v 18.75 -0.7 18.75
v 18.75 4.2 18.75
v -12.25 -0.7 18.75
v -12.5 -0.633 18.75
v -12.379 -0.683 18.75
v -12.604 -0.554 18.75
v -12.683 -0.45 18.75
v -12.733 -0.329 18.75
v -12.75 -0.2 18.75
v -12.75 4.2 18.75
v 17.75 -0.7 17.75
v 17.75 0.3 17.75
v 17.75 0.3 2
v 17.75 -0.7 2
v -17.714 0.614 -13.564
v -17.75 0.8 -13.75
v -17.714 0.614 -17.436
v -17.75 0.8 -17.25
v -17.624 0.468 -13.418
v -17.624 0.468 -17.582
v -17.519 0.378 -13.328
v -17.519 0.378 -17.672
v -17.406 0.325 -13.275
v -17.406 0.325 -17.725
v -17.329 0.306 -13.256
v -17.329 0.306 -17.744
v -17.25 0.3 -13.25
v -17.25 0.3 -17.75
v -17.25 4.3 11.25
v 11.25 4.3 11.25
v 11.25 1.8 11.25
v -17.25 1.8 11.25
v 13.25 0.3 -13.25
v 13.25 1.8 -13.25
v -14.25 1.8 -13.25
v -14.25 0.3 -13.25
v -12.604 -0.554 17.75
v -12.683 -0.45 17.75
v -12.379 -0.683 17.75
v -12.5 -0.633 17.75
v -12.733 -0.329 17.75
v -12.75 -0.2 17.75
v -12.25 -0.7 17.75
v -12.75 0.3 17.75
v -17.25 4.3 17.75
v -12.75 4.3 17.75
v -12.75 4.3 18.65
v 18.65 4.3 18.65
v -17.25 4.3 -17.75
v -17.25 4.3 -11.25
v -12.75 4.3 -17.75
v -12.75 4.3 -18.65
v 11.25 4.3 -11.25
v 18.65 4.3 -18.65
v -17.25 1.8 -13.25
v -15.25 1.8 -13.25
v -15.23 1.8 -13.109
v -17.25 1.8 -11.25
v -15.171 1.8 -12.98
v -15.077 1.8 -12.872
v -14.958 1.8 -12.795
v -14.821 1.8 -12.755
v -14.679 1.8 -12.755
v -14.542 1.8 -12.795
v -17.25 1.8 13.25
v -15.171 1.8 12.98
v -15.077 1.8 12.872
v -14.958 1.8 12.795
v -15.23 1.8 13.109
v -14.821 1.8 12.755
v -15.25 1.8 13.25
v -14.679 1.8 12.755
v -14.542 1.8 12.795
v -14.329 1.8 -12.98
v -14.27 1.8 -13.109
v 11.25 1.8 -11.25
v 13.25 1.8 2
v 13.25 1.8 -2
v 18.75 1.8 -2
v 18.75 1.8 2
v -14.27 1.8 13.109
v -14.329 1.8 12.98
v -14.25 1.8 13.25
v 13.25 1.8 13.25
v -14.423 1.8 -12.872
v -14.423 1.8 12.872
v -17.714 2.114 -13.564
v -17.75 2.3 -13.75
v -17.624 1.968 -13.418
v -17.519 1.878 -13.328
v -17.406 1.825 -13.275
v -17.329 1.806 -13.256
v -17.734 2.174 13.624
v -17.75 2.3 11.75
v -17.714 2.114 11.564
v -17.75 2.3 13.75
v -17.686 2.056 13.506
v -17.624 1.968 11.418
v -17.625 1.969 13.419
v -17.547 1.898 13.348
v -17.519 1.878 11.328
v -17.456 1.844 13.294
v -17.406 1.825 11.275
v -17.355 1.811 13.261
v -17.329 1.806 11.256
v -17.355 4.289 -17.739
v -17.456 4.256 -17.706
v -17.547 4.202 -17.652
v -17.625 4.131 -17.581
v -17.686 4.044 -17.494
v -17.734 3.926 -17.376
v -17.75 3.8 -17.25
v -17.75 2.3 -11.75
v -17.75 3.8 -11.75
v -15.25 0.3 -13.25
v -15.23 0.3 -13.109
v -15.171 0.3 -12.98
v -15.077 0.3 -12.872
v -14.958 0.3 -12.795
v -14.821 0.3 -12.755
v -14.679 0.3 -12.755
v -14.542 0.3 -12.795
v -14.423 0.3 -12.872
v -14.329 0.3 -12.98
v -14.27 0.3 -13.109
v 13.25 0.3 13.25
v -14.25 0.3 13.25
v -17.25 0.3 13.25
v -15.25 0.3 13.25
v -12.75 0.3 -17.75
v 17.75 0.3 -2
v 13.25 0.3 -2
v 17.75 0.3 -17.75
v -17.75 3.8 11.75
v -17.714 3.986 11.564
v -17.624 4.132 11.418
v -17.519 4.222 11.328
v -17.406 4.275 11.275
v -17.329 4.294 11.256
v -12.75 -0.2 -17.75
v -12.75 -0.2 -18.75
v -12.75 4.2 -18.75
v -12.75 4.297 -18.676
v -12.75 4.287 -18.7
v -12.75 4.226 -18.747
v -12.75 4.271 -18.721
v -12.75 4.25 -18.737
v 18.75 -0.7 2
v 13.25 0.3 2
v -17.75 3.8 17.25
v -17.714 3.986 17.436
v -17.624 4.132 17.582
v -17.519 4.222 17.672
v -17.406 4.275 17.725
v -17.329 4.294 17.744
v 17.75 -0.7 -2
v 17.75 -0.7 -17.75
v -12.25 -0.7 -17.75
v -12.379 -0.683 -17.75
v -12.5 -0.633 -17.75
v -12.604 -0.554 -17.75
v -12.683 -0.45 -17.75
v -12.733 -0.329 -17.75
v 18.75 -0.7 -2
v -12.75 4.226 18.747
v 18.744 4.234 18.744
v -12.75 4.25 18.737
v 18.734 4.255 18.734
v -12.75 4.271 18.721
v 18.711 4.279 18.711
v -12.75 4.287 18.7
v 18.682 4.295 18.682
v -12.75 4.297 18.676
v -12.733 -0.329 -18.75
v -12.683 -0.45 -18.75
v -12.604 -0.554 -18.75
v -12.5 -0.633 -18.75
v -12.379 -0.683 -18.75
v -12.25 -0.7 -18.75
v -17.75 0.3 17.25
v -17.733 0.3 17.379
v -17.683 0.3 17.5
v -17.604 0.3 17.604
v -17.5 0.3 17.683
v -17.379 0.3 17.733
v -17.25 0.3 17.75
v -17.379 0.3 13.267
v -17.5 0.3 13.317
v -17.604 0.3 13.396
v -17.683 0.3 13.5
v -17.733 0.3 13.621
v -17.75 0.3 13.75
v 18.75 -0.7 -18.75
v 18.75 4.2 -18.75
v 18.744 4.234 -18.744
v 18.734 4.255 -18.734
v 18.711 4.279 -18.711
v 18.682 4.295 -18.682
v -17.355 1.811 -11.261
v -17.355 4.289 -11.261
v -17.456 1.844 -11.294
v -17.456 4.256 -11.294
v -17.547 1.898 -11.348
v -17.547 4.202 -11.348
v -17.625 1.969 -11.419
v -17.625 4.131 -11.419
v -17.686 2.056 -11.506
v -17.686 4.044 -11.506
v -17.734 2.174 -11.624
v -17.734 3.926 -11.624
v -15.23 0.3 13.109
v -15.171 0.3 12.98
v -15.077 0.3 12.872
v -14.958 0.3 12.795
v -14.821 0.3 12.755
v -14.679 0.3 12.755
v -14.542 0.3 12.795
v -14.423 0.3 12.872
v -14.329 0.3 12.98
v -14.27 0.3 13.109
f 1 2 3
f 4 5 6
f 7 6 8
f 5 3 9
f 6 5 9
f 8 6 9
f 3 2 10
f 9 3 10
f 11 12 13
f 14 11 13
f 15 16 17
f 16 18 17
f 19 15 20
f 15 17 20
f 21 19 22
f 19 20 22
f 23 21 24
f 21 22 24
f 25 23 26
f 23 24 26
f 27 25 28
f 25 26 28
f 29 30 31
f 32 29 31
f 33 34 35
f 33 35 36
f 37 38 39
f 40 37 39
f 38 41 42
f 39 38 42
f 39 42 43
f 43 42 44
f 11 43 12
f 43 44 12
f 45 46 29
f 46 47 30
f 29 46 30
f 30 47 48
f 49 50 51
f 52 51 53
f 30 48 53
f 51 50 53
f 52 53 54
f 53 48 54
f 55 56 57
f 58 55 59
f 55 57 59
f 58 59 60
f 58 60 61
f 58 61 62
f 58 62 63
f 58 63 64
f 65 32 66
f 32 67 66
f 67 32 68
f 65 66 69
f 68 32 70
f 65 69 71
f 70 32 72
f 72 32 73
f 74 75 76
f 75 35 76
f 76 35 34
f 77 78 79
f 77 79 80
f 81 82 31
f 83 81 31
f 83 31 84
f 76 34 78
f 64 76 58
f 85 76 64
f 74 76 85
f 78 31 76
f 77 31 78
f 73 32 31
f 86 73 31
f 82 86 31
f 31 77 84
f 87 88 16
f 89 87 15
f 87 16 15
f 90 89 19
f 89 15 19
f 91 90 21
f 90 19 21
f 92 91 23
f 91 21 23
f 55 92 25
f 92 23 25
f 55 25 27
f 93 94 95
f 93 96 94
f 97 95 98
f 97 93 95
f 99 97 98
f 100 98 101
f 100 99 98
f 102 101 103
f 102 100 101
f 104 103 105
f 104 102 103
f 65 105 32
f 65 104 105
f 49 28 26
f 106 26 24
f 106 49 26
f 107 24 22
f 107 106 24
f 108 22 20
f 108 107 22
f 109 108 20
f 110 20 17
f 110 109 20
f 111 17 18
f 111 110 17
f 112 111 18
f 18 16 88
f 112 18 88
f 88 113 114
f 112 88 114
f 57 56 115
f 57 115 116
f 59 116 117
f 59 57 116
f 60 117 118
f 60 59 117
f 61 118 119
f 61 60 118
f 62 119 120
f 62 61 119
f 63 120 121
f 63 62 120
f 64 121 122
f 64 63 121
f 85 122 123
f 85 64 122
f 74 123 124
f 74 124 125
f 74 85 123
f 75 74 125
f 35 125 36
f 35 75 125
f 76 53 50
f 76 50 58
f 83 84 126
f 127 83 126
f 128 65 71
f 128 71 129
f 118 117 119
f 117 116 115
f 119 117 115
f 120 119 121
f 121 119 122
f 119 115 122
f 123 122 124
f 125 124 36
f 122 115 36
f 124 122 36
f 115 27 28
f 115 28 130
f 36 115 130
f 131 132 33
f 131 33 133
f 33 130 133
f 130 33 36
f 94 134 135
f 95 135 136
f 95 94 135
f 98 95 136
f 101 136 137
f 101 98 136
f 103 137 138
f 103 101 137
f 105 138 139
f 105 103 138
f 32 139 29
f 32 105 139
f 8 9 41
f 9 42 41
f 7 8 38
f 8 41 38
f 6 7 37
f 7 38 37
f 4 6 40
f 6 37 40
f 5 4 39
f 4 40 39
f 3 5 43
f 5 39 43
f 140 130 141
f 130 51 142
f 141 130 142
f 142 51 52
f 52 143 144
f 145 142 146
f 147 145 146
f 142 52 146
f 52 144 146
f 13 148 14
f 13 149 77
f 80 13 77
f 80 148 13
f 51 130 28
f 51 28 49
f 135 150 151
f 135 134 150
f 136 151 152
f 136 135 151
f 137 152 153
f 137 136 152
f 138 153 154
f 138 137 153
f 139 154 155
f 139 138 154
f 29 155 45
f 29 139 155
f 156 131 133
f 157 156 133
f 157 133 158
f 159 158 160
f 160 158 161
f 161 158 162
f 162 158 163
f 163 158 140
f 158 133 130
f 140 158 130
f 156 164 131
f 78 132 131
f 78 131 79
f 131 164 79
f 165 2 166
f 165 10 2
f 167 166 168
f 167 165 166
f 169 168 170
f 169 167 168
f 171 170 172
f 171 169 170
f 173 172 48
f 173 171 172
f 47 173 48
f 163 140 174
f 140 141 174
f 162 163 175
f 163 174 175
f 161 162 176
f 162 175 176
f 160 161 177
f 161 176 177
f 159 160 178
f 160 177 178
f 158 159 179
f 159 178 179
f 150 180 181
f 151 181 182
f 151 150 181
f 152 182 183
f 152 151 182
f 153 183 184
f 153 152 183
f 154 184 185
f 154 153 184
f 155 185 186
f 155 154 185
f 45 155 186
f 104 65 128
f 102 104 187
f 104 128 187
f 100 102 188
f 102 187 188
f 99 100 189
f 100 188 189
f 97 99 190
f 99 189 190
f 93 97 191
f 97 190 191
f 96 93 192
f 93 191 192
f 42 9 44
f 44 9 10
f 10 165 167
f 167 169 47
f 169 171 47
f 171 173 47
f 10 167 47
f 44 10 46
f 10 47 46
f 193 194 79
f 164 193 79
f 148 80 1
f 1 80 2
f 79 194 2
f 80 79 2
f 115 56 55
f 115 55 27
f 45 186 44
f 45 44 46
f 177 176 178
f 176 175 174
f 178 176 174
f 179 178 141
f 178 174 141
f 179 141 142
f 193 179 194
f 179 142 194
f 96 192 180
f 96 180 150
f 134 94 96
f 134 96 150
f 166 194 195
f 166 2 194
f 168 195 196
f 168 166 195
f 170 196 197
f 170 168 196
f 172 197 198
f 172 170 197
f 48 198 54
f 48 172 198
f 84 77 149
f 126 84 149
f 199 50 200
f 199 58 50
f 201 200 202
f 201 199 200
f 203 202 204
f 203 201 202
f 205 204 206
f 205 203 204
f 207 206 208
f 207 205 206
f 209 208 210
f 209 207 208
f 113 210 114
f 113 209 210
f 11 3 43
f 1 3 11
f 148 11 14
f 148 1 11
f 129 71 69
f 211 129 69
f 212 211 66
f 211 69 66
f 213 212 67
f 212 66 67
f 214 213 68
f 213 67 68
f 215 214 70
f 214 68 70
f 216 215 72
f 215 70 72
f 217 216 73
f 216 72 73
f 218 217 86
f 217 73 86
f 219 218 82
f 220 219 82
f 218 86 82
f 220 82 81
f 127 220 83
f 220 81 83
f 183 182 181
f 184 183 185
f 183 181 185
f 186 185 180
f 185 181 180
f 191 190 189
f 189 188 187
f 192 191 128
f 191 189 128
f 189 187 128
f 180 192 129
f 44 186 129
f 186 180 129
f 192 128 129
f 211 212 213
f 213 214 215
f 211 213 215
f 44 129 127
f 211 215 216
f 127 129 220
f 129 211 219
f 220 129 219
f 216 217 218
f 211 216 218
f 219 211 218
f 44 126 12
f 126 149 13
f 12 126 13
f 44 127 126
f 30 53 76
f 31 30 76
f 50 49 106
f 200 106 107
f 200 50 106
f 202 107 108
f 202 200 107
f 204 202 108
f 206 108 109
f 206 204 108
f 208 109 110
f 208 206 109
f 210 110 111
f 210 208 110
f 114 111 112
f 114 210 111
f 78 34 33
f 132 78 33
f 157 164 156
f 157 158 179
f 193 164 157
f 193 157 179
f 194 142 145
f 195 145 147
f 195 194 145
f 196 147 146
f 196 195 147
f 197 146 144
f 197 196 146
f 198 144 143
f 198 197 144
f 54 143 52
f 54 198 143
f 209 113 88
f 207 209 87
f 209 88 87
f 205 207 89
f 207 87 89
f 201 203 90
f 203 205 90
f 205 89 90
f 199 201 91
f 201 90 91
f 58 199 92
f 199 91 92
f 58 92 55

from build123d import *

# Parameters (mm, degrees)
PAD002_DEPTH       = 17.75
PAD002_DEPTH_BACK  = 17.75
POLARPATTERN_COUNT = 2
POLARPATTERN_ANGLE = 270
FILLET_R           = 0.5
PAD004_DEPTH       = 1.5
PAD005_DEPTH       = 5
FILLET005_R        = 0.1
FILLET006_R        = 0.5
FILLET007_R        = 0.5
SKETCH009_W        = 2.5
SKETCH009_H        = 4
POCKET001_DEPTH    = 36.501


with BuildPart() as part:
    # Sketch003 → Pad002 (new body, two sides)
    with BuildSketch(Plane.YZ) as pad002_sk:
        Polygon((0, -17.75), (4, -17.75), (4, -11.25), (1.5, -11.25), (1.5, -13.25), (0, -13.25), align=None)
    pad002 = extrude(amount=PAD002_DEPTH) + extrude(pad002_sk.sketch, amount=-PAD002_DEPTH_BACK)

    # PolarPattern: Pad002 ×2 about axis
    polarpattern_axis = Axis((0, 0, 0), (0, 1, 0))
    for i in range(1, POLARPATTERN_COUNT):
        add(pad002.rotate(polarpattern_axis, i * POLARPATTERN_ANGLE / (POLARPATTERN_COUNT - 1)))

    # Mirrored: Pad002 across Sketch003 H_Axis
    add(pad002.mirror(Plane.XY))

    # Fillet
    fillet_edges = [part.edges().sort_by_distance(p)[0] for p in [
        (-17.75, 4, 14.5),
        (-17.75, 2.75, 11.25),
        (-17.75, 0.75, 13.25),
        (-17.75, 1.5, 12.25),
        (-17.75, 2, 17.75),
    ]]
    fillet(fillet_edges, radius=FILLET_R)

    # Sketch007 → Pad004 (join)
    with BuildSketch(Plane(origin=(0, 1.5, 0), x_dir=(0, 0, -1), z_dir=(0, -1, 0))):
        with BuildLine():
            ThreePointArc((-13.25, -15.25), (-12.75, -14.75), (-13.25, -14.25))
            Line((-13.25, -14.25), (-13.25, -15.25))
        make_face()
    pad004 = extrude(amount=PAD004_DEPTH)

    # Sketch008 (on Face25 of Pad004) → Pad005 (join)
    with BuildSketch(Plane.ZX.offset(4)):
        Polygon((-18.75, 18.75), (18.75, 18.75), (18.75, -12.75), (17.75, -12.75), (17.75, 17.75), (-17.75, 17.75), (-17.75, -12.75), (-18.75, -12.75), align=None)
    extrude(amount=-PAD005_DEPTH)

    # Fillet005
    fillet005_edges = [part.edges().sort_by_distance(p)[0] for p in [
        (18.75, 4, 0),
        (3, 4, -18.75),
        (3, 4, 18.75),
    ]]
    fillet(fillet005_edges, radius=FILLET005_R)

    # Fillet006
    fillet006_edges = [part.edges().sort_by_distance(p)[0] for p in [
        (-17.75, 2.75, -11.25),
        (-17.75, 1.5, -12.25),
        (-17.75, 0, -15.5),
        (-17.75, 0.75, -13.25),
        (-17.75, 4, -14.5),
        (-17.75, 2, -17.75),
    ]]
    fillet(fillet006_edges, radius=FILLET006_R)

    # Fillet007
    fillet007_edges = [part.edges().sort_by_distance(p)[0] for p in [
        (-12.75, -1, 18.25),
        (-12.75, -1, -18.25),
    ]]
    fillet(fillet007_edges, radius=FILLET007_R)

    # Mirrored001: Pad004 across Sketch007 V_Axis
    add(pad004.mirror(Plane(origin=(0, 1.5, 0), x_dir=(0, -1, 0), z_dir=(0, 0, -1))))

    # Sketch009 (on Face9 of Mirrored001) → Pocket001 (cut, through all)
    with BuildSketch(Plane.YZ.offset(18.75)):
        with Locations((0.25, 0)):
            Rectangle(SKETCH009_W, SKETCH009_H)
    extrude(amount=-POCKET001_DEPTH, mode=Mode.SUBTRACT)


with BuildPart() as part_1:
    # Body001 placement: moved
    add(part.part.moved(Location((0, 0.3, 0))))


solid = part_1.part
